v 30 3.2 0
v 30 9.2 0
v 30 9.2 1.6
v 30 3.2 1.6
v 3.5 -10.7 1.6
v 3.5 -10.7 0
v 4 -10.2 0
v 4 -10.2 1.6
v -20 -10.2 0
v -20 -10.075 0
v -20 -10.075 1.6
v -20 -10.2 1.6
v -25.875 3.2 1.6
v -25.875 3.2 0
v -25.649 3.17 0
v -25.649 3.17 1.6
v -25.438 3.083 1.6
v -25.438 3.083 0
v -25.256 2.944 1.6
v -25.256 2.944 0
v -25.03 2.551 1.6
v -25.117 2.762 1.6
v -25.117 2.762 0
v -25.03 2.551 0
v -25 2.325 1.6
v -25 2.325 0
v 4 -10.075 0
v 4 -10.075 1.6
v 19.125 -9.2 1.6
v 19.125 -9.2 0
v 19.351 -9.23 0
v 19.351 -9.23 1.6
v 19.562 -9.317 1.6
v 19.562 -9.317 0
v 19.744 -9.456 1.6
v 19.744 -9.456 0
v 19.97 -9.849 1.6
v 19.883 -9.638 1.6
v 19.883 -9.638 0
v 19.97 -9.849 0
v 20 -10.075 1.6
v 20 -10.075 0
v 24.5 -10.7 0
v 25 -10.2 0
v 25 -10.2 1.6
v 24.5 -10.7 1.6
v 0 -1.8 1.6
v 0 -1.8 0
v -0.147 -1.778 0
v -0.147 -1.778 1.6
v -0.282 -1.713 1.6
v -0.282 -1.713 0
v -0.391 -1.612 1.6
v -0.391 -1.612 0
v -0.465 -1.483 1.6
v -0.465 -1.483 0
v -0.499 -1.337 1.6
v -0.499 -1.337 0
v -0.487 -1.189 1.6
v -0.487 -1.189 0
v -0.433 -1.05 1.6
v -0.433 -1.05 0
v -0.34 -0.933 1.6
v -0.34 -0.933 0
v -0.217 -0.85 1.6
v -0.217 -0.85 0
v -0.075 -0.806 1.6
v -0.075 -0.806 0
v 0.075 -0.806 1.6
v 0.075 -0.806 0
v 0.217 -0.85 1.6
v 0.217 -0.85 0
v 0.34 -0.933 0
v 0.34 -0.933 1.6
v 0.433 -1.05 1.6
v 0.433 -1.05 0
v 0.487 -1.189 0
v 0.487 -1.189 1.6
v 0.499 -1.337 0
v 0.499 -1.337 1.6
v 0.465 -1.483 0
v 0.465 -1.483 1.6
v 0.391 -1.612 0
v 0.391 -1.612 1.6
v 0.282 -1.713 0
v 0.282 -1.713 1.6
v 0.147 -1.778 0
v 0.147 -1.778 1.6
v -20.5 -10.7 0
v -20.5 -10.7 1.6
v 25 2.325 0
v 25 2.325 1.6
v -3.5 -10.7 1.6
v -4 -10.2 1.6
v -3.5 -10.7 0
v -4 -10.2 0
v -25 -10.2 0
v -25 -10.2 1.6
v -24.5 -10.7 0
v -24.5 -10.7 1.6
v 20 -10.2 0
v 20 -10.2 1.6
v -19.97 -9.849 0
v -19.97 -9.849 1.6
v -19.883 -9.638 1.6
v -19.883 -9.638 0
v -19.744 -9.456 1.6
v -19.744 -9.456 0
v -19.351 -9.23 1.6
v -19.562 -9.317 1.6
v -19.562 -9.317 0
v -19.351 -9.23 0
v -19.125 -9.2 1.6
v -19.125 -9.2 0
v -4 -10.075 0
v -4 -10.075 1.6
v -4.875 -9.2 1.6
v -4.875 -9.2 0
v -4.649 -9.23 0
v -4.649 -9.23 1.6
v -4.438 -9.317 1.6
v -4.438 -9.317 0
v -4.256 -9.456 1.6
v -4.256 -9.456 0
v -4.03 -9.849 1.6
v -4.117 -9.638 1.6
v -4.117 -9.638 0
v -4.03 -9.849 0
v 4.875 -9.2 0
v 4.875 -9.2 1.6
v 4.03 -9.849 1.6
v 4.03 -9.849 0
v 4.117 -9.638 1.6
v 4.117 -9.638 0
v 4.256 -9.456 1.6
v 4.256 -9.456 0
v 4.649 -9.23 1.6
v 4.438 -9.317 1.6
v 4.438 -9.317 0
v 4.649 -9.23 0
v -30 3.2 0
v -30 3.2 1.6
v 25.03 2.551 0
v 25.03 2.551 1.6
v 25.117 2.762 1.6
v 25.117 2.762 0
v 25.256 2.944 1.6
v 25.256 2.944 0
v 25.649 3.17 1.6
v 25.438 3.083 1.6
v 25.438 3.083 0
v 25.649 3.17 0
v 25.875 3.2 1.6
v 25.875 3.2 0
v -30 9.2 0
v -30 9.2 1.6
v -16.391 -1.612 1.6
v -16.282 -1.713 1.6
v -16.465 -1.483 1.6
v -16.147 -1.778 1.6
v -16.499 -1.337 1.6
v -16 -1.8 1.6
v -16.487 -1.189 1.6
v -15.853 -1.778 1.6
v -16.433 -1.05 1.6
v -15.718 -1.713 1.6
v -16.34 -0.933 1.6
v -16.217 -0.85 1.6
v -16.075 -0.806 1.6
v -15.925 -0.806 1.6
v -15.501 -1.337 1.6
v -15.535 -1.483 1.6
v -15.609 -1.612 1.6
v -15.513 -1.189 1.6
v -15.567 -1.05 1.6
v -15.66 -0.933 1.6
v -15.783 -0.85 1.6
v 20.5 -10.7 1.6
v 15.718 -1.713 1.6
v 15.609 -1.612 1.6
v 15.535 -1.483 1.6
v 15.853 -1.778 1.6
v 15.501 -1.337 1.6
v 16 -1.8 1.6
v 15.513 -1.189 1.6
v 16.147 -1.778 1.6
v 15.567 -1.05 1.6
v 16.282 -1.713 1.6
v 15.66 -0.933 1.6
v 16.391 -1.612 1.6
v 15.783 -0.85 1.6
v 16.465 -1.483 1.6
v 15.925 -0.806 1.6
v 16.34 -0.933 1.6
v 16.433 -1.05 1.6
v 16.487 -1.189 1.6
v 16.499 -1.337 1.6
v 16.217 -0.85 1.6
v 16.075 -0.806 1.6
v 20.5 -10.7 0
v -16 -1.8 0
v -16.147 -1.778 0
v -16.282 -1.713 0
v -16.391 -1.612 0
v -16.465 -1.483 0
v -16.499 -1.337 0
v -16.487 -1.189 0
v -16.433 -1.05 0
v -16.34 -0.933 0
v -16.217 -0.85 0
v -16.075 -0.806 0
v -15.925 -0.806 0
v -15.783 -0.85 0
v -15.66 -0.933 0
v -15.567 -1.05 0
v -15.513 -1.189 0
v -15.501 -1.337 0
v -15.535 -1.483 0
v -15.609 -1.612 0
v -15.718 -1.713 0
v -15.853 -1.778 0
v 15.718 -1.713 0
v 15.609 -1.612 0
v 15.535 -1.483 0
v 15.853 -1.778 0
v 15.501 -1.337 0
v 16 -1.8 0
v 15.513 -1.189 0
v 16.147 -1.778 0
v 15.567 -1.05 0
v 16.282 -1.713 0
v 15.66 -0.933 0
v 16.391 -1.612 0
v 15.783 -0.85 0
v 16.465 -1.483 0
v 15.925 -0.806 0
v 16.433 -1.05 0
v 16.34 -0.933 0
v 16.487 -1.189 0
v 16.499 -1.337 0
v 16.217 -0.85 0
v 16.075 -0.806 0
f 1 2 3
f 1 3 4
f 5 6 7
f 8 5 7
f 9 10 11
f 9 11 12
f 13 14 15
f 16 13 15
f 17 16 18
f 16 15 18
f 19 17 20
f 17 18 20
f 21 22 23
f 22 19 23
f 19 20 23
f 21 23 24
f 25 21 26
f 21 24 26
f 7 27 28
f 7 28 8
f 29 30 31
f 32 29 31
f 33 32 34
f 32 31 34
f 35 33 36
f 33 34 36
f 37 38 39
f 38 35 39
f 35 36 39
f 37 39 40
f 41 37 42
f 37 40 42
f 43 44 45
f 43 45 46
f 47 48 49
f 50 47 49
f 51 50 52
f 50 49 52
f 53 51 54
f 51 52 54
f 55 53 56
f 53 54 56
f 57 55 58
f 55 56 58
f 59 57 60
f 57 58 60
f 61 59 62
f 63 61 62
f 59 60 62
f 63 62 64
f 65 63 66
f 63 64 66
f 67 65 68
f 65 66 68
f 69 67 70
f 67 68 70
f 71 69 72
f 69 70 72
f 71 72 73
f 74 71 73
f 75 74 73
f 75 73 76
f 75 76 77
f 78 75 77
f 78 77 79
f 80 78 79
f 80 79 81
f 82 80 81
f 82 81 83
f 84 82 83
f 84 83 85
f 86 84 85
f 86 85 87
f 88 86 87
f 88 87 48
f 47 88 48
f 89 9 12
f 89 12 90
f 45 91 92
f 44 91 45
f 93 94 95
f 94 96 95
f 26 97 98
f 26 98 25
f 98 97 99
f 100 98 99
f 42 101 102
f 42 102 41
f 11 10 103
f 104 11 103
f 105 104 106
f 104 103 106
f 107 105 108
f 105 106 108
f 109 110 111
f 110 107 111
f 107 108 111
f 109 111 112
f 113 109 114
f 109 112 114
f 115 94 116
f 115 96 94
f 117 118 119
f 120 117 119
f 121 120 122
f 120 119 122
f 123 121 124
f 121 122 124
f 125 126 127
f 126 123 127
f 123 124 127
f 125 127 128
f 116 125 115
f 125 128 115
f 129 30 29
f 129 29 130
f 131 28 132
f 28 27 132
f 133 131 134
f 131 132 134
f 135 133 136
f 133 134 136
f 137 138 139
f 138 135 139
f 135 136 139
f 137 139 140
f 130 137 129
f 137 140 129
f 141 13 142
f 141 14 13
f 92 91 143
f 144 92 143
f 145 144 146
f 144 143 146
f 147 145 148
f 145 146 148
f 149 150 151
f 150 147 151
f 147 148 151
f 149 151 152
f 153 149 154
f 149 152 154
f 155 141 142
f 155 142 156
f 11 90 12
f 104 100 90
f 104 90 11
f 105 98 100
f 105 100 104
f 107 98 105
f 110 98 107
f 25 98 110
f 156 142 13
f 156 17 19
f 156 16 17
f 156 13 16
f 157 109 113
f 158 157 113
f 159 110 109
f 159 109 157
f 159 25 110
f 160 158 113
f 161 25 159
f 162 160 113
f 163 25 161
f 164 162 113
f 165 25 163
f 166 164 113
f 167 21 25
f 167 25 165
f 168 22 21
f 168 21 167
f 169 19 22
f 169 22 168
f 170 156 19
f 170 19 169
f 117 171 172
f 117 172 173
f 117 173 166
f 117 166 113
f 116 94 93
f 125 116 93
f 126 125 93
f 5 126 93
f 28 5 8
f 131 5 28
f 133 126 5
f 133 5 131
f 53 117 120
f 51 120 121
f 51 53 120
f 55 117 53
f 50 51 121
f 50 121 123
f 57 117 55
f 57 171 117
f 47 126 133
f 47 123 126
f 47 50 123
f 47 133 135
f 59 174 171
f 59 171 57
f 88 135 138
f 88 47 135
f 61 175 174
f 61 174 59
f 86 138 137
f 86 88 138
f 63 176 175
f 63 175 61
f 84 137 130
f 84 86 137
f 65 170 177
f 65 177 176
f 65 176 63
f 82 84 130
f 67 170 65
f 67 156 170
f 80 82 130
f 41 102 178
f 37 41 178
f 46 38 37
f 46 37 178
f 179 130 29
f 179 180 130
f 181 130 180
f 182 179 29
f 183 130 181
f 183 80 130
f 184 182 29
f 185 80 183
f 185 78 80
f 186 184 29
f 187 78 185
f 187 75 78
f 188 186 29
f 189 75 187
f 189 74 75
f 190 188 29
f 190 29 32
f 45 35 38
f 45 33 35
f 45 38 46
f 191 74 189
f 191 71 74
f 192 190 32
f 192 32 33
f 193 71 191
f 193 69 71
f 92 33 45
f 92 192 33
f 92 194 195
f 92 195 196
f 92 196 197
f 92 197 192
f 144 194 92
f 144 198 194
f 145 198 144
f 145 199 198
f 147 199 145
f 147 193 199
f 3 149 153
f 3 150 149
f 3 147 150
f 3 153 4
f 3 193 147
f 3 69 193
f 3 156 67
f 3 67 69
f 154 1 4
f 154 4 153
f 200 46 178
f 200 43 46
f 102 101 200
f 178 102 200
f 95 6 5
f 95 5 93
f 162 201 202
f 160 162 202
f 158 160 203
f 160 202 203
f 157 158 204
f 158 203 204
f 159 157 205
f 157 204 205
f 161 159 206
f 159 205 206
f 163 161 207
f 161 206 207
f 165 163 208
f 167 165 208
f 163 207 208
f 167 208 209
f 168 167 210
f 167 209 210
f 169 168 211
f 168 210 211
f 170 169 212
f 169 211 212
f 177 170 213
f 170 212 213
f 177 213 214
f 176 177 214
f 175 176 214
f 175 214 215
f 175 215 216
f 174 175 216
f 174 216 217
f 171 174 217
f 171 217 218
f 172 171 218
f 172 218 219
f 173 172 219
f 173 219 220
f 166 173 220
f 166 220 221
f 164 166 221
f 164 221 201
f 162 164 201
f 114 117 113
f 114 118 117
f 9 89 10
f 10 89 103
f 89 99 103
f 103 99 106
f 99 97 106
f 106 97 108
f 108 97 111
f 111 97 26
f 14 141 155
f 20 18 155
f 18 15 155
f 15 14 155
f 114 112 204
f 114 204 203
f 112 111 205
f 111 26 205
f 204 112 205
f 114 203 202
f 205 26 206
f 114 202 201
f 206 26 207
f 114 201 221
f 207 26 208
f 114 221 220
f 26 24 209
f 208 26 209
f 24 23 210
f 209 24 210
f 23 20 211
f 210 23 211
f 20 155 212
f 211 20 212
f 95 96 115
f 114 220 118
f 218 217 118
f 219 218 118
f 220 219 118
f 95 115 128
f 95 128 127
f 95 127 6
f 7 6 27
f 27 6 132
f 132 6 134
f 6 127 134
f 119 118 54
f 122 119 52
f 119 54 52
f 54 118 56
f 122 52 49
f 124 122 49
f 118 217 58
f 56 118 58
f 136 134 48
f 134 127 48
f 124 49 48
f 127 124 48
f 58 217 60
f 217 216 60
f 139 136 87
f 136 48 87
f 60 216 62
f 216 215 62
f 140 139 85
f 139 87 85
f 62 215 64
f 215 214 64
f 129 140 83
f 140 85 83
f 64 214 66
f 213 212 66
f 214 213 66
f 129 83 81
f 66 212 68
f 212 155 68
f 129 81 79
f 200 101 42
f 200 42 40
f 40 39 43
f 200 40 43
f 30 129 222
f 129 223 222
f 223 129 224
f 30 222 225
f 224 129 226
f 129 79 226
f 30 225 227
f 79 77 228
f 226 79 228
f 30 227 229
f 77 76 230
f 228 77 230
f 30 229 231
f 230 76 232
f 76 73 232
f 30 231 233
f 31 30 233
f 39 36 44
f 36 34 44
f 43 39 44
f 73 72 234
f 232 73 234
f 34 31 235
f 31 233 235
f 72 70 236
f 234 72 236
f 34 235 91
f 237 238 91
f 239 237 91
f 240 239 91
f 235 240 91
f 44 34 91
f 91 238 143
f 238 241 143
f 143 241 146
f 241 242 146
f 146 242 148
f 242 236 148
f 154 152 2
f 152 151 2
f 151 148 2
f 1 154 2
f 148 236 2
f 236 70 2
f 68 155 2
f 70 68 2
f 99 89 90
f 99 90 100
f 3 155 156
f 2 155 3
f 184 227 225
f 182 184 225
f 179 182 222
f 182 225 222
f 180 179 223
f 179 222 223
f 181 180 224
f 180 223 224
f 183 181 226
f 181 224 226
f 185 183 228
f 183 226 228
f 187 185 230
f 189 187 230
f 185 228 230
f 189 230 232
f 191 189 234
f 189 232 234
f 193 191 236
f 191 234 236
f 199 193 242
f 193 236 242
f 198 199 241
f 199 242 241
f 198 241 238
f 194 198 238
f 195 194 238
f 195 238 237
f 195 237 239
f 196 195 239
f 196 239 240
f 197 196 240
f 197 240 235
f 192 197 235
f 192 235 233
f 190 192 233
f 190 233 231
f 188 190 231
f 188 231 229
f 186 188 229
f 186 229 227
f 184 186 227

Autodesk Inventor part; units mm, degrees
ref_plane "YZ Plane" through (0, 0, 0) normal (1, 0, 0) x (0, 1, 0)
ref_plane "XZ Plane" through (0, 0, 0) normal (0, 1, 0) x (-1, 0, 0)
ref_plane "XY Plane" through (0, 0, 0) normal (0, 0, 1) x (1, 0, 0)
sketch "Sketch1" plane through (0, 0, 0) normal (0, 0, 1) x (1, 0, 0)
  line L0 (-30, 9.2) -> (30, 9.2)
  line L1 (30, 9.2) -> (30, 3.2)
  line L2 (30, 3.2) -> (25.875, 3.2)
  line L3 (25, 2.325) -> (25, -10.2)
  line L4 (24.5, -10.7) -> (20.5, -10.7)
  line L5 (20, -10.2) -> (20, -10.075)
  line L6 (19.125, -9.2) -> (4.875, -9.2)
  line L7 (4, -10.075) -> (4, -10.2)
  line L8 (3.5, -10.7) -> (-3.5, -10.7)
  line L9 (-4, -10.2) -> (-4, -10.075)
  line L10 (-4.875, -9.2) -> (-19.125, -9.2)
  line L11 (-20, -10.075) -> (-20, -10.2)
  line L12 (-20.5, -10.7) -> (-24.5, -10.7)
  line L13 (-25, -10.2) -> (-25, 2.325)
  line L14 (-25.875, 3.2) -> (-30, 3.2)
  line L15 (-30, 3.2) -> (-30, 9.2)
  line L16 (0, 7.251) -> (0, -4.9434) construction
  line L17 (-9.4671, 0) -> (8.147, 0) construction
  arc A0 (-25, 2.325) -> (-25.875, 3.2) centre (-25.875, 2.325) ccw
  arc A1 (25.875, 3.2) -> (25, 2.325) centre (25.875, 2.325) ccw
  line L18 (-25, -10.2) -> (-24.5, -10.7)
  line L19 (-20, -10.2) -> (-20.5, -10.7)
  line L20 (-4, -10.2) -> (-3.5, -10.7)
  line L21 (3.5, -10.7) -> (4, -10.2)
  line L22 (20, -10.2) -> (20.5, -10.7)
  line L23 (25, -10.2) -> (24.5, -10.7)
  arc A2 (-19.125, -9.2) -> (-20, -10.075) centre (-19.125, -10.075) ccw
  arc A3 (-4, -10.075) -> (-4.875, -9.2) centre (-4.875, -10.075) ccw
  arc A4 (4.875, -9.2) -> (4, -10.075) centre (4.875, -10.075) ccw
  arc A5 (20, -10.075) -> (19.125, -9.2) centre (19.125, -10.075) ccw
  point P0 (0, 0)
  dimension "d0" = 8
  dimension "d1" = 1.5
  dimension "d2" = 5
  dimension "d3" = 20
  dimension "d4" = 18.4
  dimension "d6" = 6
  dimension "d7" = 5
  dimension "d19" = 45
  dimension "d20" = 0.5
  dimension "d23" = 1.75
extrude "Extrusion1" add sketch "Sketch1" along normal blind 1.6
sketch "Sketch2" plane through (0, 0, 1.6) normal (0, 0, 1) x (1, 0, 0)
  line L0 (-30, 9.2) -> (30, 9.2) projected
  point P0 (0, 0)
  point P1 (0, -1.3)
  point P2 (-16, -1.3)
  point P3 (16, -1.3)
  dimension "d10" = 16
  dimension "d11" = 16
  dimension "d21" = 10.5
hole "Hole1" at (0, -1.3, 1.6) at (-16, -1.3, 1.6) at (16, -1.3, 1.6) direction (0, 0, -1) diameter 1 end through all
properties part number "AK-C-C39-Pinhole-Board"
